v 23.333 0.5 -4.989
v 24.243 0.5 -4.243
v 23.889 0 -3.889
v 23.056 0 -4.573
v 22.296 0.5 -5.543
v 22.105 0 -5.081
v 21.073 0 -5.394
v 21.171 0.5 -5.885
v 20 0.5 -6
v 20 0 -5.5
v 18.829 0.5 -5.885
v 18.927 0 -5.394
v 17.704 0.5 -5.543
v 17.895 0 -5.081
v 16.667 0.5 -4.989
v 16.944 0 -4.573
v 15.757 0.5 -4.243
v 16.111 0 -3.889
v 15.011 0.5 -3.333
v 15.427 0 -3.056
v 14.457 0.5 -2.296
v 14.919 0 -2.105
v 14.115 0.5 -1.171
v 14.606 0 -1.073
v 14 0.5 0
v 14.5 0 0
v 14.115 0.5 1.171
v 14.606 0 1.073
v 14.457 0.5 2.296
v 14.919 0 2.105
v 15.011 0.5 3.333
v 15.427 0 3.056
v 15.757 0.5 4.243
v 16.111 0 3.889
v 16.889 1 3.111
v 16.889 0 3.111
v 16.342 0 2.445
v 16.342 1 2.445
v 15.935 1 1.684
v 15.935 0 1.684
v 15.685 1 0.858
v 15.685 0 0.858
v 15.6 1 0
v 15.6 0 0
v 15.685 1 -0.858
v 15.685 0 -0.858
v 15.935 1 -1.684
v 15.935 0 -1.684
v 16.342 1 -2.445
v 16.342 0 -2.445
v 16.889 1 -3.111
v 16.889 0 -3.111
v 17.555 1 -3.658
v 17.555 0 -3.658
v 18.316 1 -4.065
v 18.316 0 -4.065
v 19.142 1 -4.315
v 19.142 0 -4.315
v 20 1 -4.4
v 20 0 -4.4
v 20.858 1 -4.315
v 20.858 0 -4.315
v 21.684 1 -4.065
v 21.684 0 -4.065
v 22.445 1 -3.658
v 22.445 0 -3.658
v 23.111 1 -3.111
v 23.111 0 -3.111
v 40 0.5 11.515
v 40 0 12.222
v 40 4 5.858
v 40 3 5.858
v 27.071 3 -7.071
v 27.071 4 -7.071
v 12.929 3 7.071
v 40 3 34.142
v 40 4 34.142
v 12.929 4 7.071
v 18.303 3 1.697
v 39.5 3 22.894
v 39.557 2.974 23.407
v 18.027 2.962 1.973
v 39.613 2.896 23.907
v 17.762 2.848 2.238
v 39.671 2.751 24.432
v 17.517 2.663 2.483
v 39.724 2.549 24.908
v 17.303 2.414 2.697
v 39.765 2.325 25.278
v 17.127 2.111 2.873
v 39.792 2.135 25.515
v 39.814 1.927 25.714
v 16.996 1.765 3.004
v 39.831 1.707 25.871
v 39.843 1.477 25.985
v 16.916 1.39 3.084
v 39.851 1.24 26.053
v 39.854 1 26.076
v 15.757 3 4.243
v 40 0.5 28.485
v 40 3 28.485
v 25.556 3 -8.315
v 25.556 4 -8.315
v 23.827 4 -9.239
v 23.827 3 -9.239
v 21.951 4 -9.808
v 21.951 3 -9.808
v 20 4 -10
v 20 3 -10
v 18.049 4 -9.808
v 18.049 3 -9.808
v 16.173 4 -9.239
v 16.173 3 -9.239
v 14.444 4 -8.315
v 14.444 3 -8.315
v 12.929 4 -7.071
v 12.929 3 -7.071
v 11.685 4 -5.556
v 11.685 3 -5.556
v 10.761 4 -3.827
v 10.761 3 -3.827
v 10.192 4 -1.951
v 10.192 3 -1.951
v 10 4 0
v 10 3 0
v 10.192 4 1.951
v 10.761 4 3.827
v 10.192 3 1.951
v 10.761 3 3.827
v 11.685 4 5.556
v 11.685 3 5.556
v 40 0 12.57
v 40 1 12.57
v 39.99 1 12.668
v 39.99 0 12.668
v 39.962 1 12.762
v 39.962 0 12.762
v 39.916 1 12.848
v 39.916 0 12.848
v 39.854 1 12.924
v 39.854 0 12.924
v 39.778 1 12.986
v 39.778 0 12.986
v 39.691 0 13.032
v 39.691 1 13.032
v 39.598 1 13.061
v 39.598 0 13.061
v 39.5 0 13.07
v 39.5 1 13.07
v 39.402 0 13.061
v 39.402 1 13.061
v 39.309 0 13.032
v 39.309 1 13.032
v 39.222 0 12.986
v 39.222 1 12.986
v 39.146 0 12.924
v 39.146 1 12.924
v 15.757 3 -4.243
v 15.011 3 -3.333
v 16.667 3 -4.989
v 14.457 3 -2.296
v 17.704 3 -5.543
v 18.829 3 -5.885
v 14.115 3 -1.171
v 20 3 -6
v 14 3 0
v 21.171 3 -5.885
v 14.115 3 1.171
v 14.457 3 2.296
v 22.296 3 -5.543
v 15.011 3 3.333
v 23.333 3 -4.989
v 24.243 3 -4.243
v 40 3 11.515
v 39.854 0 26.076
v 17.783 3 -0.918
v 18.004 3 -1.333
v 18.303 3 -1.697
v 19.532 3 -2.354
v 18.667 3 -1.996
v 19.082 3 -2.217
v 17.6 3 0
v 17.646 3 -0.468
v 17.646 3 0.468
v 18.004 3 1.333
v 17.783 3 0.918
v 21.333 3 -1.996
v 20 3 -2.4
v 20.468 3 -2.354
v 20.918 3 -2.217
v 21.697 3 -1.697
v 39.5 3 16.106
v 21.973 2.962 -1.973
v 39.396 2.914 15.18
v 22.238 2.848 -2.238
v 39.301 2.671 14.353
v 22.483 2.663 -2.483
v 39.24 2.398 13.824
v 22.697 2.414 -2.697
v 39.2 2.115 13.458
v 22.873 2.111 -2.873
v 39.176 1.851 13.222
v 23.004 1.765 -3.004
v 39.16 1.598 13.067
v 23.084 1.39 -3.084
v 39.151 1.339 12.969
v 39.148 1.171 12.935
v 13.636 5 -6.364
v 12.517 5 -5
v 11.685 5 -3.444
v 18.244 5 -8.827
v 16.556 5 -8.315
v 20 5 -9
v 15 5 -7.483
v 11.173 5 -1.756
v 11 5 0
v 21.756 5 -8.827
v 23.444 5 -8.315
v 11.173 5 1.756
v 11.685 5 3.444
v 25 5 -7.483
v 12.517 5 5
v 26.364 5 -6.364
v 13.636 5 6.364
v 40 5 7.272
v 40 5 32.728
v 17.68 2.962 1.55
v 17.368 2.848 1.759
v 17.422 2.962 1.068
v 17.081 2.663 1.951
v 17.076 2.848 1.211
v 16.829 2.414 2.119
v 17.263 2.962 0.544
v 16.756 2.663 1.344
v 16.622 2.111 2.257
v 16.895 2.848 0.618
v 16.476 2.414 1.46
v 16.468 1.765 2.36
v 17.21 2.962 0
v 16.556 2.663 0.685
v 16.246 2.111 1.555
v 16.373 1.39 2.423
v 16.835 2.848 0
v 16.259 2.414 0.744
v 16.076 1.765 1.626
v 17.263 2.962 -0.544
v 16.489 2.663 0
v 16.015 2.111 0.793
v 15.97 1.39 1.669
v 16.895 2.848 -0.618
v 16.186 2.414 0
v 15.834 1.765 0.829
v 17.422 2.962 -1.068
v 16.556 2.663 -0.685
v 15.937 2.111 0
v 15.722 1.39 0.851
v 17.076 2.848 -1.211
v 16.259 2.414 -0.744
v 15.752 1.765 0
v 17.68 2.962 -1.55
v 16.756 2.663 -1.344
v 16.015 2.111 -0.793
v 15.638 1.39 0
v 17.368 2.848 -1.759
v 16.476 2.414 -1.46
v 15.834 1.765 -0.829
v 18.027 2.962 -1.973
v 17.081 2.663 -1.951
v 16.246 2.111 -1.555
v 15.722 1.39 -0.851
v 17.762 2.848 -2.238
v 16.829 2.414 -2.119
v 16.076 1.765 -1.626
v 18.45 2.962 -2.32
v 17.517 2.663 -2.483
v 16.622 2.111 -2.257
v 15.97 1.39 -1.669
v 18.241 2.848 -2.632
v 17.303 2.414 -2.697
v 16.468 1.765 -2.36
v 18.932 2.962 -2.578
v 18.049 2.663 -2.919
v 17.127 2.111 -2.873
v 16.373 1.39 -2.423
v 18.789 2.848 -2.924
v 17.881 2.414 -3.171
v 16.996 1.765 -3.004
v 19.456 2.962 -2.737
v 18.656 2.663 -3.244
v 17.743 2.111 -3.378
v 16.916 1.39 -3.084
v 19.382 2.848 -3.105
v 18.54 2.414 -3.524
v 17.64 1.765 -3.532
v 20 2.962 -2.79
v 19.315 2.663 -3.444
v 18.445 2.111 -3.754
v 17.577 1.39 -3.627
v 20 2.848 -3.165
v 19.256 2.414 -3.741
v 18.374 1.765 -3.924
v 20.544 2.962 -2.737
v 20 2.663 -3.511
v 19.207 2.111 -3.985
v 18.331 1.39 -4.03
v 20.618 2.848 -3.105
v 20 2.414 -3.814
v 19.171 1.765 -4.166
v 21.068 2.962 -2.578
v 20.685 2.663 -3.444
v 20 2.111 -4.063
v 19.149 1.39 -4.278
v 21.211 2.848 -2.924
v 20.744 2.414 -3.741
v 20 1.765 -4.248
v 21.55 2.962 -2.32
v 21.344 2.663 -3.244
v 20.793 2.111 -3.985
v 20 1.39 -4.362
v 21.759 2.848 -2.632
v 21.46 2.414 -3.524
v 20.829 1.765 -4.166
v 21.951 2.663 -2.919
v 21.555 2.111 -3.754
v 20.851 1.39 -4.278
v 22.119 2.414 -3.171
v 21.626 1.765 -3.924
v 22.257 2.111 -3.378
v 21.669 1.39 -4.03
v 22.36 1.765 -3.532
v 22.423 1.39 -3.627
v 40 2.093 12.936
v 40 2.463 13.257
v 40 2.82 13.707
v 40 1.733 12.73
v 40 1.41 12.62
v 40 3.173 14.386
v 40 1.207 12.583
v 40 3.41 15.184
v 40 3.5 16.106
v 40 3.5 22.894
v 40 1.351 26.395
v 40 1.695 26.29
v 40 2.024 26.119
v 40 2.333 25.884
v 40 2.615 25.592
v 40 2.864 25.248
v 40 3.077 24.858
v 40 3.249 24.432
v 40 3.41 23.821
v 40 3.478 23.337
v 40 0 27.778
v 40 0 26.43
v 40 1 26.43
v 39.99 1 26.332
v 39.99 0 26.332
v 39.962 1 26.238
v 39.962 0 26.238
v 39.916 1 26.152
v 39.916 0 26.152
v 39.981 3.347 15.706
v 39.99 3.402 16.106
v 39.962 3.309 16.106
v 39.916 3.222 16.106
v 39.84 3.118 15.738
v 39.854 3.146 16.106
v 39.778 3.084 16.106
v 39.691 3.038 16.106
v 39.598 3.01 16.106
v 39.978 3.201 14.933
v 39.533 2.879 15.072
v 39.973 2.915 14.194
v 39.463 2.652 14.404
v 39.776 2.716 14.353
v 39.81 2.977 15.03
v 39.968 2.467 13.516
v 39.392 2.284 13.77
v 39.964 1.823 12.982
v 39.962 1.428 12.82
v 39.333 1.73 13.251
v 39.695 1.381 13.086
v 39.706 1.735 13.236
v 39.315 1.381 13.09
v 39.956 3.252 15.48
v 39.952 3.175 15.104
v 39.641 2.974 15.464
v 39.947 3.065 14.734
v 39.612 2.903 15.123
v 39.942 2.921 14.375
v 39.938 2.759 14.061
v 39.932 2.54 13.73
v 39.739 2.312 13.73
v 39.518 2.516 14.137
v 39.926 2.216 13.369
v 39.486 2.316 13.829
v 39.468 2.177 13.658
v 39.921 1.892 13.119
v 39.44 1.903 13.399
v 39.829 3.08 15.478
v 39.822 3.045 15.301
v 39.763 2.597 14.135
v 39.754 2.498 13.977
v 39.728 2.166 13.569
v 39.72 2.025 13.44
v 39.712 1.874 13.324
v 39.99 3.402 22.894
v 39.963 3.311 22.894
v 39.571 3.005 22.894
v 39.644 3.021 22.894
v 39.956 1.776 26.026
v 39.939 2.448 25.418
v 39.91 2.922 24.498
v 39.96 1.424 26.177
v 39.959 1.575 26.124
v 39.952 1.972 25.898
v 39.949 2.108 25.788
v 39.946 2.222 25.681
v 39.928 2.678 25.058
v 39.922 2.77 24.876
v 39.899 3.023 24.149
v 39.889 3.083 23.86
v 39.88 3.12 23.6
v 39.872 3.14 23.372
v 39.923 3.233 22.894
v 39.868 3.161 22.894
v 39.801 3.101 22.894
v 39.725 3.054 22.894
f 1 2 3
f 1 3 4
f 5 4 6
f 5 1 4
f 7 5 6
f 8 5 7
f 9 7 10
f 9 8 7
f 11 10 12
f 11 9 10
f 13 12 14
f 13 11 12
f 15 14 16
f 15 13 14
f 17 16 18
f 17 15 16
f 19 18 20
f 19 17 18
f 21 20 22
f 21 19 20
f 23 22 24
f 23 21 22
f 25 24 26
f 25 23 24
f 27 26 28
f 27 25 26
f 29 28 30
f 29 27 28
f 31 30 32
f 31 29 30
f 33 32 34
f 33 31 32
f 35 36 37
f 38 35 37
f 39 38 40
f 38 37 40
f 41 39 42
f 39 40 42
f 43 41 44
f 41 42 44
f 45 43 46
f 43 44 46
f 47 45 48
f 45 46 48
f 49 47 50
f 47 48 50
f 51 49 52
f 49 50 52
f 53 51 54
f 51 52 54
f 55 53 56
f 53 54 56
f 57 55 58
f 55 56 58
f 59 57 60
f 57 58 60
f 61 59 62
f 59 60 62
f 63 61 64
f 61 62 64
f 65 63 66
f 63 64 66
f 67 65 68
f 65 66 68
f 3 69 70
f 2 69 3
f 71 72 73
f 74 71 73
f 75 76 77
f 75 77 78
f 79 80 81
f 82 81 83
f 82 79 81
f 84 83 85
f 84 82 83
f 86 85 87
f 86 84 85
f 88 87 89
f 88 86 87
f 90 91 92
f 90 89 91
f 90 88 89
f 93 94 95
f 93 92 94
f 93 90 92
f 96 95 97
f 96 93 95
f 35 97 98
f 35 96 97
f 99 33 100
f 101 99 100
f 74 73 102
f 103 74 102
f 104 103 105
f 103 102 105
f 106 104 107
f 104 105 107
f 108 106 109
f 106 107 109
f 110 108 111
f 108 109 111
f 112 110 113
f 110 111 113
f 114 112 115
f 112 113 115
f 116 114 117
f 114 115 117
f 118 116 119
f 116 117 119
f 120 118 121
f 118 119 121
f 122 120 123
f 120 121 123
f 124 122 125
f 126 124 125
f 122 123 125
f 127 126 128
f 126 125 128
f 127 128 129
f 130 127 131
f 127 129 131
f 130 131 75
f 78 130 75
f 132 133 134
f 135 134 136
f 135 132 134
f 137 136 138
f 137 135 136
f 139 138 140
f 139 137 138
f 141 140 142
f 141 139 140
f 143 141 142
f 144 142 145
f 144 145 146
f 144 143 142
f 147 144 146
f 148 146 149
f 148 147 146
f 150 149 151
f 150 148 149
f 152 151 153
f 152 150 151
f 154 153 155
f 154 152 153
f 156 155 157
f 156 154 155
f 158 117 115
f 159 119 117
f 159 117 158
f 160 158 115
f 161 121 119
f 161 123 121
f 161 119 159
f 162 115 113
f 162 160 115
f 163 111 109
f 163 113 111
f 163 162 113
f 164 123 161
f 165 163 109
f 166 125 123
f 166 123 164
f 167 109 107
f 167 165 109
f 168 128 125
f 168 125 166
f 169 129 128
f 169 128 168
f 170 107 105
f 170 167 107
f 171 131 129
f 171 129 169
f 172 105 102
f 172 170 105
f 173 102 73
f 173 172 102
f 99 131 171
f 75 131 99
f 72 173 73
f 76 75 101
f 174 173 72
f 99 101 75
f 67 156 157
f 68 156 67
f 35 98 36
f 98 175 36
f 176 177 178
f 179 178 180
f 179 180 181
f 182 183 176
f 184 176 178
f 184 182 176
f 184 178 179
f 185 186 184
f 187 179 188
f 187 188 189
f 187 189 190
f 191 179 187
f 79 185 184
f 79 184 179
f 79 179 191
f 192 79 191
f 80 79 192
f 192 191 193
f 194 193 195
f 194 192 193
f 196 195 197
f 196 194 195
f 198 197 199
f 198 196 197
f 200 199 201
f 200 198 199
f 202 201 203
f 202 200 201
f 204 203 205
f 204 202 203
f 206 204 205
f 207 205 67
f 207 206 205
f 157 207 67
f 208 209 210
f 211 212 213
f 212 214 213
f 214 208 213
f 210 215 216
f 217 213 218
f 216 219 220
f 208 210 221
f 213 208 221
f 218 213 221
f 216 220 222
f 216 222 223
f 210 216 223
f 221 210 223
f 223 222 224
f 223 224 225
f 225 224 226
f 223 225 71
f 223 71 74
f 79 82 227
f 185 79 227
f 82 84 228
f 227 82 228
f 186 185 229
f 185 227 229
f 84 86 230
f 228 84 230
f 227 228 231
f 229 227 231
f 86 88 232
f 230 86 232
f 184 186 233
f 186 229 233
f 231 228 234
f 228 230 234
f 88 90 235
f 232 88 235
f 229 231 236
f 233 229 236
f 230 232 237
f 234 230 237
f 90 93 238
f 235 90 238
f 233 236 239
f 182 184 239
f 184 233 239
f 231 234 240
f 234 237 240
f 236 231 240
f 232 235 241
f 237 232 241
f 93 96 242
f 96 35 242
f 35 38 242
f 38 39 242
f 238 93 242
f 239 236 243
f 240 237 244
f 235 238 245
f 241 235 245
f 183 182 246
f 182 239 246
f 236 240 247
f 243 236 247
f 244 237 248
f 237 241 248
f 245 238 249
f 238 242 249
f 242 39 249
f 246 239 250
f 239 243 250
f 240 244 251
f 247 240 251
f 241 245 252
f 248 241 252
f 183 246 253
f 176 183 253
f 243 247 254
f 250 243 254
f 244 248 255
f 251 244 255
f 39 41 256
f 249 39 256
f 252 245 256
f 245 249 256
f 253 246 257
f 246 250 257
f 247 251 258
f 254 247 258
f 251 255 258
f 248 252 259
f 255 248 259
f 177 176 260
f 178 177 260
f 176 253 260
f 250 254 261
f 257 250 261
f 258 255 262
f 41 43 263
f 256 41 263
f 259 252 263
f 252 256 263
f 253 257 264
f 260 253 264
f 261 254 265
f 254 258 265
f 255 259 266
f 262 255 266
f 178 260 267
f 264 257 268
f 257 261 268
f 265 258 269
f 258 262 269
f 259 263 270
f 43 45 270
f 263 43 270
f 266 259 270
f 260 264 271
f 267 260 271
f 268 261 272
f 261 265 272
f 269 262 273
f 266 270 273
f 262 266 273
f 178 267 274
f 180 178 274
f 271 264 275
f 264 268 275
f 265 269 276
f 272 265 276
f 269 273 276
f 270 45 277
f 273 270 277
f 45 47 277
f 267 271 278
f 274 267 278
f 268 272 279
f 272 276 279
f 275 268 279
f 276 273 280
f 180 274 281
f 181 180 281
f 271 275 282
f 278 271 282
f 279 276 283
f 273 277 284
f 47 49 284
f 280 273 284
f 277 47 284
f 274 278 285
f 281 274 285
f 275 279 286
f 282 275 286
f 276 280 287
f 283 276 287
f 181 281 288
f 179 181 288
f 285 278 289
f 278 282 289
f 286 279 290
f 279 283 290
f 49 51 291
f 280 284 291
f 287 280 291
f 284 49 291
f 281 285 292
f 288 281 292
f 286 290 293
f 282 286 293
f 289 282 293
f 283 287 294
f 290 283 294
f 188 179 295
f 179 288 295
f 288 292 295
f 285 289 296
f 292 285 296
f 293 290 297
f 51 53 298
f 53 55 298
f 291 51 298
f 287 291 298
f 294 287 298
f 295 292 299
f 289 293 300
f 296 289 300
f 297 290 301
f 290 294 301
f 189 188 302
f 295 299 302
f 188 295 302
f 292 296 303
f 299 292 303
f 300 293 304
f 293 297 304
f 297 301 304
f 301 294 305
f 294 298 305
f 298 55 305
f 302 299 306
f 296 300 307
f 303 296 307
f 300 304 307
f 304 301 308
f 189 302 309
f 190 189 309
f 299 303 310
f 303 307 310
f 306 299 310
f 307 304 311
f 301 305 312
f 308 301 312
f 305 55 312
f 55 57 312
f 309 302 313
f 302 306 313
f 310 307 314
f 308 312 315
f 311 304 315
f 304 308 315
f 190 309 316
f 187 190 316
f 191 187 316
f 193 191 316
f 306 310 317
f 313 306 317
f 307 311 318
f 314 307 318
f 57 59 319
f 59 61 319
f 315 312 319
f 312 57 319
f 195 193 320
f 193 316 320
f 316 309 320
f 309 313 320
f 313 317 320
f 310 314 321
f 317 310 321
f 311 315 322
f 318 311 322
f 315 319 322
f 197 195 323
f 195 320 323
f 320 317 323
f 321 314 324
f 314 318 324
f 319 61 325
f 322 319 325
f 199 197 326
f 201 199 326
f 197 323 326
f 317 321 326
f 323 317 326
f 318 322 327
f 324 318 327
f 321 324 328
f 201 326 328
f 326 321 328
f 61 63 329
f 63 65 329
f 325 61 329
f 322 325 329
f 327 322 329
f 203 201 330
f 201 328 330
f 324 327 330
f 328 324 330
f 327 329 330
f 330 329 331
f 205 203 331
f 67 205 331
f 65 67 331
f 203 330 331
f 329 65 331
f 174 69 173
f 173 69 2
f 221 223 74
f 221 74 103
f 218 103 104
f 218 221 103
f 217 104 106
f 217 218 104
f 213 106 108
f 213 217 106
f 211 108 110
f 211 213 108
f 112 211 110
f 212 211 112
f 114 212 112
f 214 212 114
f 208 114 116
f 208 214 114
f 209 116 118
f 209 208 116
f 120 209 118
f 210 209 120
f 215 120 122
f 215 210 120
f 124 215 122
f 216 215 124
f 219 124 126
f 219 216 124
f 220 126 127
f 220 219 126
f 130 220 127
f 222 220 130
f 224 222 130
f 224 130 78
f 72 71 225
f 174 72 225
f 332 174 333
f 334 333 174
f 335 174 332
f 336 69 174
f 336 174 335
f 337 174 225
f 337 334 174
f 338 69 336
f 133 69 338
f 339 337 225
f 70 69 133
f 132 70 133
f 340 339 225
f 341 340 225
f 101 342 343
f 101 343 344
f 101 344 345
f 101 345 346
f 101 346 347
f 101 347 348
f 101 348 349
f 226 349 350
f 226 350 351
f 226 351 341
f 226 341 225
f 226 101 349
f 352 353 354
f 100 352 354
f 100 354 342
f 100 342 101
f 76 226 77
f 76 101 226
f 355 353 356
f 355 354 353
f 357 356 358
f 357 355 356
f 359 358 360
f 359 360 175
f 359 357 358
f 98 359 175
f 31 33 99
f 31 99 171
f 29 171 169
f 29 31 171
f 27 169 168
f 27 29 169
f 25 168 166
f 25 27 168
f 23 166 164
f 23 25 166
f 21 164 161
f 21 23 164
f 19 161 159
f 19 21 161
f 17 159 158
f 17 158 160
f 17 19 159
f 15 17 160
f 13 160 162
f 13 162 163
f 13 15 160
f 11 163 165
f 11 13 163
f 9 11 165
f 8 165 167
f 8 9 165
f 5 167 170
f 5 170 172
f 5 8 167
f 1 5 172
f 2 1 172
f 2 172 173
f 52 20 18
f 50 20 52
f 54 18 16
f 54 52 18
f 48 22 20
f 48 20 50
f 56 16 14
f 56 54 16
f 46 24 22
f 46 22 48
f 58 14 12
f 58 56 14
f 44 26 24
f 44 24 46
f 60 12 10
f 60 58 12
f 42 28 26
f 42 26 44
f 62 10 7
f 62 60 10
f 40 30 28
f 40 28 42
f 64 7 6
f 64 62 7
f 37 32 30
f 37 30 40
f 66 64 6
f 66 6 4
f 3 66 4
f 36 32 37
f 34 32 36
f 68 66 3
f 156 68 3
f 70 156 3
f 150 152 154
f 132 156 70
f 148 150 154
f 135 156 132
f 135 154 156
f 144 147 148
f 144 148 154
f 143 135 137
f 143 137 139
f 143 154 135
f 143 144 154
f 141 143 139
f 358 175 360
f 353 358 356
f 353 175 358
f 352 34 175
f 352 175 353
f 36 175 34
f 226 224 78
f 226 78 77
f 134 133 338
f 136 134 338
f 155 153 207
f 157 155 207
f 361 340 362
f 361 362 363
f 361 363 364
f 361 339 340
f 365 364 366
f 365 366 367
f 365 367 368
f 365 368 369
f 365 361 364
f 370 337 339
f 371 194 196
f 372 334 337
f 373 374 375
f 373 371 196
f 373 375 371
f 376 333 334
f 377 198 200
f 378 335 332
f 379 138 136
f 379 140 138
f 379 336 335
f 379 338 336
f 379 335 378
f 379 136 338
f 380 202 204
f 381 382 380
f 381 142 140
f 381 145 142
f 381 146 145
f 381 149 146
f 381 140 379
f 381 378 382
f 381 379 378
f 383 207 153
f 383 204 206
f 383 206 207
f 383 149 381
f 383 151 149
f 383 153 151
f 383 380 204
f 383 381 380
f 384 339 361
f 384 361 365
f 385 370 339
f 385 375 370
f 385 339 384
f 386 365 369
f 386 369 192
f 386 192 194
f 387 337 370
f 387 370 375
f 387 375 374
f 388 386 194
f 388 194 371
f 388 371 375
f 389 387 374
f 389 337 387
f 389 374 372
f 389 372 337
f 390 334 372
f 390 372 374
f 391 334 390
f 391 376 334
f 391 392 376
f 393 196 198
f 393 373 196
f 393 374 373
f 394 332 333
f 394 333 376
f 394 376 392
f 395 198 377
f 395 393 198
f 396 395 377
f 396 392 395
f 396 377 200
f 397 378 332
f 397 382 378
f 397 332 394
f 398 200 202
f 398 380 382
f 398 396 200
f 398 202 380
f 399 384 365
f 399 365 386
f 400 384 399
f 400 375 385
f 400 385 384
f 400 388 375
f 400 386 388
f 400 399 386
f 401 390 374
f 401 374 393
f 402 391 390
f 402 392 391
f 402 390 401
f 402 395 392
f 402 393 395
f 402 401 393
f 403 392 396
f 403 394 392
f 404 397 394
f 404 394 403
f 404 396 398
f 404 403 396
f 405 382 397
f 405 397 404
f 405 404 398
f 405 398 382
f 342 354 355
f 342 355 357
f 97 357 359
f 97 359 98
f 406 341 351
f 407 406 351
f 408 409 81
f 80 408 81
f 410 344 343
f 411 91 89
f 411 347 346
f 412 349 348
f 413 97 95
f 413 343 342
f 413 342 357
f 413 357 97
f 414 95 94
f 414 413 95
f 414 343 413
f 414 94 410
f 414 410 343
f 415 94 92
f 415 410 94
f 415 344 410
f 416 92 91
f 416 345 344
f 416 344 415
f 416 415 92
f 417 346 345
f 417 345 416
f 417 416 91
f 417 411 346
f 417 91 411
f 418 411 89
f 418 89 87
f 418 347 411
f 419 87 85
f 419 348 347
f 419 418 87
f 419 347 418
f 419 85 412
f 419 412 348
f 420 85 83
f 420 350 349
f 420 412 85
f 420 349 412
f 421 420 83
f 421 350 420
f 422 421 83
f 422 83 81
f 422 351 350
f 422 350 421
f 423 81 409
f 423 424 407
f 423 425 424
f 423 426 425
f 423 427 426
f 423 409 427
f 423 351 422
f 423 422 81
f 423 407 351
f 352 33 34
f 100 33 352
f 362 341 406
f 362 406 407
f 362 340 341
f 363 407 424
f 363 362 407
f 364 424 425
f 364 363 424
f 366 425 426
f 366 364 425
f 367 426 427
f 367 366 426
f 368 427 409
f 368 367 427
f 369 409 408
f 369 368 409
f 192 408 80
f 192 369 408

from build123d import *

# Parameters (mm, degrees)
PAD020_DEPTH    = 3
PAD021_DEPTH    = 2
CHAMFER028_SIZE = 1
POCKET031_DEPTH = 3
FILLET021_R     = 2
CHAMFER030_SIZE = 0.5
FILLET022_R     = 0.5


with BuildPart() as part:
    # Sketch055 → Pad020 (new body)
    with BuildSketch(Plane.XZ):
        with BuildLine():
            ThreePointArc((15.757359, 4.242641), (15.757359, -4.242641), (24.242641, -4.242641))
            Line((40, 11.514719), (24.242641, -4.242641))
            Line((40, 28.485281), (40, 11.514719))
            Line((15.757359, 4.242641), (40, 28.485281))
        make_face()
    extrude(amount=-PAD020_DEPTH)

    # Sketch056 (on Face6 of Pad020) → Pad021 (join)
    with BuildSketch(Plane(origin=(0, 3, 0), x_dir=(-1, 0, 0), z_dir=(0, 1, 0))):
        with BuildLine():
            Line((-40, 5.857864), (-40, 34.142136))
            Line((-40, 34.142136), (-12.928932, 7.071068))
            ThreePointArc((-27.071068, -7.071068), (-12.928932, -7.071068), (-12.928932, 7.071068))
            Line((-40, 5.857864), (-27.071068, -7.071068))
        make_face()
    extrude(amount=PAD021_DEPTH)

    # Chamfer028
    chamfer028_edges = [part.edges().sort_by_distance(p)[0] for p in [
        (33.535534, 5, -0.606602),
    ]]
    chamfer(chamfer028_edges, length=CHAMFER028_SIZE)

    # Sketch057 (on Face10 of Chamfer028) → Pocket031 (cut)
    with BuildSketch(Plane.XZ):
        with BuildLine():
            Line((40, 26.22254), (16.88873, 3.11127))
            ThreePointArc((16.88873, 3.11127), (16.88873, -3.11127), (23.11127, -3.11127))
            Line((40, 13.77746), (23.11127, -3.11127))
            Line((40, 26.22254), (40, 13.77746))
        make_face()
    extrude(amount=-POCKET031_DEPTH, mode=Mode.SUBTRACT)

    # Fillet021
    fillet021_edges = [part.edges().sort_by_distance(p)[0] for p in [
        (28.444365, 3, 14.666905),
    ]]
    fillet(fillet021_edges, radius=FILLET021_R)

    # Chamfer030
    chamfer030_edges = [part.edges().sort_by_distance(p)[0] for p in [
        (27.87868, 0, 16.363961),
    ]]
    chamfer(chamfer030_edges, length=CHAMFER030_SIZE)

    # Fillet022
    fillet022_edges = [part.edges().sort_by_distance(p)[0] for p in [
        (40, 0.5, 26.22254),
    ]]
    fillet(fillet022_edges, radius=FILLET022_R)


solid = part.part
